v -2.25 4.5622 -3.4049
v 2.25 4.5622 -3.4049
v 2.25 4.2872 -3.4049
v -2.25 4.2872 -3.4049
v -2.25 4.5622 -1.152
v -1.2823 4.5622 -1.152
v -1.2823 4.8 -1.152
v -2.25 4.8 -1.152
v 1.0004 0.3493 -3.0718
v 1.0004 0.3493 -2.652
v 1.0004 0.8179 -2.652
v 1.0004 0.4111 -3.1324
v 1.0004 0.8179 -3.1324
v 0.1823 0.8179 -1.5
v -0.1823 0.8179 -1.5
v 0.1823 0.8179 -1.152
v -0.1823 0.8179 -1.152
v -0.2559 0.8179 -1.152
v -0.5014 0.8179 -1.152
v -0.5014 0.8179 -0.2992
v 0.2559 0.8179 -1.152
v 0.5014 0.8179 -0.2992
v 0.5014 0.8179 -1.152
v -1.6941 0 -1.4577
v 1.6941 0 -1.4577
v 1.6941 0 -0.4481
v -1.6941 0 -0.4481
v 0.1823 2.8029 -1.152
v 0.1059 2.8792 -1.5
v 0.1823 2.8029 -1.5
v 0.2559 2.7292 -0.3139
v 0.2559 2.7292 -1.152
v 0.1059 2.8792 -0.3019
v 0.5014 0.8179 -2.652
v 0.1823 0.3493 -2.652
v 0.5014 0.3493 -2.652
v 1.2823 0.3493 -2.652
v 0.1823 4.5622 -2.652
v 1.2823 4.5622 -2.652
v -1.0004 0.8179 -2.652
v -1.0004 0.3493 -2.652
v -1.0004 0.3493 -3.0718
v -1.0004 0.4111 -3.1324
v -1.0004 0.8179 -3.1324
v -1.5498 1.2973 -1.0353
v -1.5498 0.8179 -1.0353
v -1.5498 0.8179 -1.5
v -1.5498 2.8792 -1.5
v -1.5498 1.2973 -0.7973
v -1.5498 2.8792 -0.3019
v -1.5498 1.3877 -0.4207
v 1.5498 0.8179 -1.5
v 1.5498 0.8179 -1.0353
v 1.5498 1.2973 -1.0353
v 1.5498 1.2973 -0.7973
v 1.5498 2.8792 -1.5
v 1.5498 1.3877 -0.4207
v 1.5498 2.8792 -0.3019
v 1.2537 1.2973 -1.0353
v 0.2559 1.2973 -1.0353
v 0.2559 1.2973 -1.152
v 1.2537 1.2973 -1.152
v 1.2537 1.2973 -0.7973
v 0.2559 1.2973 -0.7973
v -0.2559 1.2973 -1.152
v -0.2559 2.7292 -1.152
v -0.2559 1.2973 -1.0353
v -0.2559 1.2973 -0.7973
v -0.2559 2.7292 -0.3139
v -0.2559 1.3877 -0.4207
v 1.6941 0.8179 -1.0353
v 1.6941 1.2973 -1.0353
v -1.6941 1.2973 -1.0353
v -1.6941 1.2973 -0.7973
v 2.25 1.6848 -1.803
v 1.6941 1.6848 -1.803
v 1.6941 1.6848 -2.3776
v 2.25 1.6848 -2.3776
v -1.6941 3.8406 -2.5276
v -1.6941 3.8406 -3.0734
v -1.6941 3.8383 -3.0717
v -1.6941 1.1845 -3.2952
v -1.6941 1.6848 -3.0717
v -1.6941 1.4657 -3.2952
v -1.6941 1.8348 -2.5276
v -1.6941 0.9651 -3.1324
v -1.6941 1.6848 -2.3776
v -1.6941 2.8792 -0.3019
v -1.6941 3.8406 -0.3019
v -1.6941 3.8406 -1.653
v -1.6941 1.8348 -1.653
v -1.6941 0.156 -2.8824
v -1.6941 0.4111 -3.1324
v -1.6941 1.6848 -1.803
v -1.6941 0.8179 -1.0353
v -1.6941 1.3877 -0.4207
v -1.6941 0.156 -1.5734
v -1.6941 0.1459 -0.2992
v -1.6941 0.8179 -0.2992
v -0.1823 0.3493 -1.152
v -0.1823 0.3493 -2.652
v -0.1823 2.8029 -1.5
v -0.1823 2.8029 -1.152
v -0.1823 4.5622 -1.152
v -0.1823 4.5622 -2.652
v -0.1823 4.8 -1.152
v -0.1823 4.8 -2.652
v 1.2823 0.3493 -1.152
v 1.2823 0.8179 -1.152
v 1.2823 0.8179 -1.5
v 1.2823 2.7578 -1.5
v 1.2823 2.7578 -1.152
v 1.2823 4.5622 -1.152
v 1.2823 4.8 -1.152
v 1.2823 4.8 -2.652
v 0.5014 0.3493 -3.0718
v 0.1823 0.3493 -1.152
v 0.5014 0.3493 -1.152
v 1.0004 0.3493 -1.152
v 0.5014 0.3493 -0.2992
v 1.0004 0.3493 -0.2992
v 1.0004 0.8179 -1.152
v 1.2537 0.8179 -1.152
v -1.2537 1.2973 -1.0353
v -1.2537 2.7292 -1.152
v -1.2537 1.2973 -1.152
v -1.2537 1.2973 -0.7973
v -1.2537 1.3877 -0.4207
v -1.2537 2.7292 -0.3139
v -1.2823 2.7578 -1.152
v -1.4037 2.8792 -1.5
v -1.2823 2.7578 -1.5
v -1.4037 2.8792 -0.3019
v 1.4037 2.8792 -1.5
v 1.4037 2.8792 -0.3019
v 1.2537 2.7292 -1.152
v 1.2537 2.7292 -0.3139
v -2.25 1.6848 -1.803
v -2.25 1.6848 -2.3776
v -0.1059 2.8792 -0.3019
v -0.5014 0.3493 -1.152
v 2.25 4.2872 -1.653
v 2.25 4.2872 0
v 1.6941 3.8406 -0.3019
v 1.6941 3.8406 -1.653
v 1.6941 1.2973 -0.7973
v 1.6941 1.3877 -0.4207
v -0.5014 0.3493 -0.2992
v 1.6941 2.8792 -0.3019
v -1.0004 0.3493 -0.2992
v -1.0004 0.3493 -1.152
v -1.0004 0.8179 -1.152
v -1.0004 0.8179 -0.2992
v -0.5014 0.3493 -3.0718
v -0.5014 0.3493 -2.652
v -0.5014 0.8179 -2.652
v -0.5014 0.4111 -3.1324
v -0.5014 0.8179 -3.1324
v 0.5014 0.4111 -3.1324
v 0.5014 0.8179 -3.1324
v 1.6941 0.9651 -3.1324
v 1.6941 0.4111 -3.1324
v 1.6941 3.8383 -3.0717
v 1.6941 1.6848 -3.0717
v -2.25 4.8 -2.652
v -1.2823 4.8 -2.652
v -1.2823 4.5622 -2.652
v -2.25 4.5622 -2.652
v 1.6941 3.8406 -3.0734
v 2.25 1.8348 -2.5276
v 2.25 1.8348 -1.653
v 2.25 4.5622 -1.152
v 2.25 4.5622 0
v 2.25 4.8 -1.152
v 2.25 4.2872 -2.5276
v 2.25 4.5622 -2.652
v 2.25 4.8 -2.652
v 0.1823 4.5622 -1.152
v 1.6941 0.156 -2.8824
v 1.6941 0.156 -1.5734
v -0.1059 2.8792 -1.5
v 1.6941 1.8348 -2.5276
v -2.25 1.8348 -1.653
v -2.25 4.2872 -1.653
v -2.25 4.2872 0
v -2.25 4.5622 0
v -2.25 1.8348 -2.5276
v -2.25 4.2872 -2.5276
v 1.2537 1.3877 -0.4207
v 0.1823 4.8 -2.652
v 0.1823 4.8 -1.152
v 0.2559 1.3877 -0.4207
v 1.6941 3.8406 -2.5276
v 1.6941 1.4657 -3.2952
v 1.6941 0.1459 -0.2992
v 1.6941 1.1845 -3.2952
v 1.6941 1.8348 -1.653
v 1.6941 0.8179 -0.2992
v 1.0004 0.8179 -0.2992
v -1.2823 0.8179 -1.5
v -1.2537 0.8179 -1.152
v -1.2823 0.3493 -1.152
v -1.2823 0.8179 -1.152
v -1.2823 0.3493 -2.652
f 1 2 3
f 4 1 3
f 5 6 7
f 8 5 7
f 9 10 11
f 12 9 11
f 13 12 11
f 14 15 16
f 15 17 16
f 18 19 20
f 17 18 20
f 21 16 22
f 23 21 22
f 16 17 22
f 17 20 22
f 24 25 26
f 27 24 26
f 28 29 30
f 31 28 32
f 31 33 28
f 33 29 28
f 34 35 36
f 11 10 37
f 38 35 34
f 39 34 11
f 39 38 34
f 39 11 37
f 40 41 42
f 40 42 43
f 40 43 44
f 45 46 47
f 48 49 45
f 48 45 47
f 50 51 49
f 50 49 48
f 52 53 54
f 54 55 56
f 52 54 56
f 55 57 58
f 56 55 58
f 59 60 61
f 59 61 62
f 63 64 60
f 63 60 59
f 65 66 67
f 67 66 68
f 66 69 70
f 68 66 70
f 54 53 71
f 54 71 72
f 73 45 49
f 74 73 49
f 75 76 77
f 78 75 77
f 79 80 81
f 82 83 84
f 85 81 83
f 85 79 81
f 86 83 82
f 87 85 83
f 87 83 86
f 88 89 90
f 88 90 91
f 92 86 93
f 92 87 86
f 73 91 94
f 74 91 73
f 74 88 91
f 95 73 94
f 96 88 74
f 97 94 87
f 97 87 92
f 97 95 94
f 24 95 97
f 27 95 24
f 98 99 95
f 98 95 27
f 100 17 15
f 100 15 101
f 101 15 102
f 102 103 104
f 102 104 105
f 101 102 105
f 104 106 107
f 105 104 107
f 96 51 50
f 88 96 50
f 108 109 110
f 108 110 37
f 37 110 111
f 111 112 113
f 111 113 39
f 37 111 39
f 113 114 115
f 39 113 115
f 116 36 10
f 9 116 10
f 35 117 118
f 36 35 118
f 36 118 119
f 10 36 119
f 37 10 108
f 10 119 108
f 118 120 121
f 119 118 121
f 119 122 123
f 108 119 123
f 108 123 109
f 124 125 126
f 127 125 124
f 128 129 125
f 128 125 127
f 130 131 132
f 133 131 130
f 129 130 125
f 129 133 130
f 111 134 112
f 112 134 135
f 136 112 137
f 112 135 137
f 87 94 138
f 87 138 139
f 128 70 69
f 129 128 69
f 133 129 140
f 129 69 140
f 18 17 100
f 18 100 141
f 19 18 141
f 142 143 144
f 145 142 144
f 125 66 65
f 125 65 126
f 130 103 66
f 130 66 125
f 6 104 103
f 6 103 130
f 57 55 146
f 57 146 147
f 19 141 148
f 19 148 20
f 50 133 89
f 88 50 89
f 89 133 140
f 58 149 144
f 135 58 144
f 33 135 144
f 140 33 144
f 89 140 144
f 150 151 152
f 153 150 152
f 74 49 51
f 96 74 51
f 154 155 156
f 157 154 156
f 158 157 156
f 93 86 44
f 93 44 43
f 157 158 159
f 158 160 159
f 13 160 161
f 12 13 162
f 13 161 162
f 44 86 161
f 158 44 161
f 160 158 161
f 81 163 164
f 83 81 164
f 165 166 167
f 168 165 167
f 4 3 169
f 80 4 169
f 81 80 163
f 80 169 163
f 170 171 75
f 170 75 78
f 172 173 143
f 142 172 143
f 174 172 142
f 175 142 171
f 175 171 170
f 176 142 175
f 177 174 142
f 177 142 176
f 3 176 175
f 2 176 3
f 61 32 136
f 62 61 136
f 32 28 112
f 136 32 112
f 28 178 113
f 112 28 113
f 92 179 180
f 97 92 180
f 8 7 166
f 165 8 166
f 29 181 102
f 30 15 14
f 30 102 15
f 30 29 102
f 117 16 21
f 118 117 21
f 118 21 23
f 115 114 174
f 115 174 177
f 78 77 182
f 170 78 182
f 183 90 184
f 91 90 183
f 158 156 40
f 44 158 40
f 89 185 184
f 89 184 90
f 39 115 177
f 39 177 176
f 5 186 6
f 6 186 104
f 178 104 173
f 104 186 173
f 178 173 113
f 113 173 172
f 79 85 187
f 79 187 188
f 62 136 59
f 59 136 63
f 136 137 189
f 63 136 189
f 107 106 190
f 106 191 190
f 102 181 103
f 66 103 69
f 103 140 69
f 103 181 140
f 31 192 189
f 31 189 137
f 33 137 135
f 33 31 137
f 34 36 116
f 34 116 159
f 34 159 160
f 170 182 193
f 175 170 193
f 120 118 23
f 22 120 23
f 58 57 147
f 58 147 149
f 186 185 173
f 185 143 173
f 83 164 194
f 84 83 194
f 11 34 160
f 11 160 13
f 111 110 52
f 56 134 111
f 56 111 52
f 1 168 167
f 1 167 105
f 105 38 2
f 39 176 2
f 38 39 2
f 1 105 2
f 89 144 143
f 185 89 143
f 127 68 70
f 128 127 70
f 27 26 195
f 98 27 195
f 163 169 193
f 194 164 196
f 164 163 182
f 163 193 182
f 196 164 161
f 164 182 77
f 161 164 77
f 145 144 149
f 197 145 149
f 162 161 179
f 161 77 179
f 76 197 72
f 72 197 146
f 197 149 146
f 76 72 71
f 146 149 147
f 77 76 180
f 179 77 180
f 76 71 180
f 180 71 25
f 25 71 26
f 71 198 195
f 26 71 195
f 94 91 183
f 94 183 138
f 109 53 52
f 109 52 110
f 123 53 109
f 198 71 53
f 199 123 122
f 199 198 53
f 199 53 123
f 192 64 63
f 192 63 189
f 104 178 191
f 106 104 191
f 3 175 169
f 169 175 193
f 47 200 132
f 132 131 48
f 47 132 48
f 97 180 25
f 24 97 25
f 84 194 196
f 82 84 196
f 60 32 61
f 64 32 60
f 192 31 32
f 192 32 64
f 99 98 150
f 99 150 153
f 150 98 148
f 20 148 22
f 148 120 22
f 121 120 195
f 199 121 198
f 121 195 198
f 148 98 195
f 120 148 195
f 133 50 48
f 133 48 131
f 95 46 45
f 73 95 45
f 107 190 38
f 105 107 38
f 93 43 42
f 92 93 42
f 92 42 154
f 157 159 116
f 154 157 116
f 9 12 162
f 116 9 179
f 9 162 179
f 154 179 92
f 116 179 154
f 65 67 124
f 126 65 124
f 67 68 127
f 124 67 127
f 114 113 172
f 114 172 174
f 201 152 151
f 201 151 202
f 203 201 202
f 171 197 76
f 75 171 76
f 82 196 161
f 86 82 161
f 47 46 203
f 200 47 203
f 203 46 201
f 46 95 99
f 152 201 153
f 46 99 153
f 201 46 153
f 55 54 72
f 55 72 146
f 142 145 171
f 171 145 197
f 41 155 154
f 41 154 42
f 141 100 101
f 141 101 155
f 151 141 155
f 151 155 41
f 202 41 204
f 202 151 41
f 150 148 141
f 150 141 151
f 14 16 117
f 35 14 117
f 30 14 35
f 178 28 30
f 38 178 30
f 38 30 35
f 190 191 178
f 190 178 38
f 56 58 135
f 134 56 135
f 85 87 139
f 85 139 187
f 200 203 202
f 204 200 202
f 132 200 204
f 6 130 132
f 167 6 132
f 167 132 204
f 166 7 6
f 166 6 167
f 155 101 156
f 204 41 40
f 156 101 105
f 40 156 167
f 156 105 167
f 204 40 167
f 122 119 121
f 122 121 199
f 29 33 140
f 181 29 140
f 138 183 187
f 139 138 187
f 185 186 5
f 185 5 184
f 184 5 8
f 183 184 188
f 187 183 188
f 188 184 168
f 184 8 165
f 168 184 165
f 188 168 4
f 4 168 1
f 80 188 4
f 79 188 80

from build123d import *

# Parameters (mm, degrees)
EXTRUDE_1_DEPTH     = 2.25
SKETCH_2_W          = 1.1
SKETCH_2_H          = 0.473559538
SKETCH_2_W_2        = 0.498992391
SKETCH_2_H_2        = 0.307326439
CUT_EXTRUDE_1_DEPTH = 1.5
SKETCH_5_W          = 1.1
SKETCH_5_H          = 0.237770676
CUT_EXTRUDE_3_DEPTH = 6.633027066
EXTRUDE_2_DEPTH     = 2.25
SKETCH_4_W          = 1.1
SKETCH_4_H          = 1.5
CUT_EXTRUDE_2_DEPTH = 4.212970342
SKETCH_6_W          = 0.997822092
SKETCH_6_H          = 0.479381763
CUT_EXTRUDE_4_DEPTH = 0.2
SKETCH_7_W          = 0.498992391
SKETCH_7_H          = 0.468620273
CUT_EXTRUDE_5_DEPTH = 7.143885496


with BuildPart() as part:
    # 草图1 → 凸台-拉伸1 (new body)
    with BuildSketch(Plane(origin=(0, 0, 0), x_dir=(0, 0, -1), z_dir=(1, 0, 0))):
        Polygon((0, 4.562229324), (1.151979455, 4.562229324), (1.151979455, 4.8), (2.651979455, 4.8), (2.651979455, 4.562229324), (3.404860606, 4.562229324), (3.404860606, 4.287187795), (3.071666363, 3.838301107), (3.071666363, 1.684829824), (3.295234427, 1.465740305), (3.295234427, 1.184498299), (3.132388227, 0.96510828), (3.132388227, 0.411082783), (2.882381357, 0.155965368), (1.573428318, 0.155965368), (1.457660209, 0), (0.448123395, 0), (0.299248107, 0.145892998), (0.299248107, 0.817879256), (1.035254024, 0.817879256), (1.035254024, 1.297261019), (0.797343028, 1.297261019), (0.420679628, 1.387660235), (0.301921402, 2.879247301), (0.301921402, 3.840575896), (0, 4.287187795), align=None)
        Polygon((1.652980181, 1.834829824), (1.802980181, 1.684829824), (2.377591251, 1.684829824), (2.527591251, 1.834829824), (2.527591251, 4.287187795), (1.652980181, 4.287187795), align=None, mode=Mode.SUBTRACT)
    extrude(amount=EXTRUDE_1_DEPTH)

    # 草图2 → 切除-拉伸1 (cut)
    with BuildSketch(Plane.XY):
        Polygon((2.25, 4.287187795), (1.694149292, 3.840575896), (1.694149292, 2.879247301), (1.694149292, 0.817879256), (1.694149292, 0), (2.25, 0), align=None)
        with Locations((0.732254764, 4.799009093)):
            Rectangle(SKETCH_2_W, SKETCH_2_H)
        Polygon((1.253711529, 2.729247301), (1.253711529, 0.817879256), (1.403711529, 0.817879256), (1.549770068, 0.817879256), (1.549770068, 2.879247301), (1.403711529, 2.879247301), align=None)
        Polygon((0, 2.879247301), (0.105889437, 2.879247301), (0.255889437, 2.729247301), (0.255889437, 0.817879256), (0, 0.817879256), align=None)
        with Locations((0.750944102, 0.502922202)):
            Rectangle(SKETCH_2_W_2, SKETCH_2_H_2)
    extrude(amount=-CUT_EXTRUDE_1_DEPTH, mode=Mode.SUBTRACT)

    # 草图5 → 切除-拉伸3 (cut, through all)
    with BuildSketch(Plane.XY.offset(-1.5)):
        with Locations((0.732254764, 4.681114662)):
            Rectangle(SKETCH_5_W, SKETCH_5_H)
        Polygon((2.25, 0.057041107), (2.25, 4.287187795), (1.694149292, 3.840575896), (1.694149292, 0.057041107), align=None)
    extrude(amount=-CUT_EXTRUDE_3_DEPTH, mode=Mode.SUBTRACT)

    # 草图3 → 凸台-拉伸2 (add)
    with BuildSketch(Plane.ZY):
        Polygon((-1.652980181, 4.287187795), (-1.652980181, 1.834829824), (-1.802980181, 1.684829824), (-2.377591251, 1.684829824), (-2.527591251, 1.834829824), (-2.527591251, 4.287187795), align=None)
    extrude(amount=-EXTRUDE_2_DEPTH)

    # 草图4 → 切除-拉伸2 (cut)
    with BuildSketch(Plane(origin=(0, 4.562229324, 0), x_dir=(1, 0, 0), z_dir=(0, 1, 0))):
        with Locations((0.732254764, 1.901979455)):
            Rectangle(SKETCH_4_W, SKETCH_4_H)
    extrude(amount=-CUT_EXTRUDE_2_DEPTH, mode=Mode.SUBTRACT)

    # 草图6 → 切除-拉伸4 (cut)
    with BuildSketch(Plane.XY.offset(-1.035254024)):
        with Locations((0.754800483, 1.057570137)):
            Rectangle(SKETCH_6_W, SKETCH_6_H)
    extrude(amount=-CUT_EXTRUDE_4_DEPTH, mode=Mode.SUBTRACT)

    # 草图7 → 切除-拉伸5 (cut, through all)
    with BuildSketch(Plane.XY.offset(-0.299248107)):
        with Locations((0.750944102, 0.58356912)):
            Rectangle(SKETCH_7_W, SKETCH_7_H)
    extrude(amount=-CUT_EXTRUDE_5_DEPTH, mode=Mode.SUBTRACT)

    # 镜向1: part across face


with BuildPart() as part_1:
    add(part.part)
    add(part.part.mirror(Plane(origin=(0, 2.559271295, -1.883517387), x_dir=(0, 0, 1), z_dir=(-1, 0, 0))))


solid = part_1.part
